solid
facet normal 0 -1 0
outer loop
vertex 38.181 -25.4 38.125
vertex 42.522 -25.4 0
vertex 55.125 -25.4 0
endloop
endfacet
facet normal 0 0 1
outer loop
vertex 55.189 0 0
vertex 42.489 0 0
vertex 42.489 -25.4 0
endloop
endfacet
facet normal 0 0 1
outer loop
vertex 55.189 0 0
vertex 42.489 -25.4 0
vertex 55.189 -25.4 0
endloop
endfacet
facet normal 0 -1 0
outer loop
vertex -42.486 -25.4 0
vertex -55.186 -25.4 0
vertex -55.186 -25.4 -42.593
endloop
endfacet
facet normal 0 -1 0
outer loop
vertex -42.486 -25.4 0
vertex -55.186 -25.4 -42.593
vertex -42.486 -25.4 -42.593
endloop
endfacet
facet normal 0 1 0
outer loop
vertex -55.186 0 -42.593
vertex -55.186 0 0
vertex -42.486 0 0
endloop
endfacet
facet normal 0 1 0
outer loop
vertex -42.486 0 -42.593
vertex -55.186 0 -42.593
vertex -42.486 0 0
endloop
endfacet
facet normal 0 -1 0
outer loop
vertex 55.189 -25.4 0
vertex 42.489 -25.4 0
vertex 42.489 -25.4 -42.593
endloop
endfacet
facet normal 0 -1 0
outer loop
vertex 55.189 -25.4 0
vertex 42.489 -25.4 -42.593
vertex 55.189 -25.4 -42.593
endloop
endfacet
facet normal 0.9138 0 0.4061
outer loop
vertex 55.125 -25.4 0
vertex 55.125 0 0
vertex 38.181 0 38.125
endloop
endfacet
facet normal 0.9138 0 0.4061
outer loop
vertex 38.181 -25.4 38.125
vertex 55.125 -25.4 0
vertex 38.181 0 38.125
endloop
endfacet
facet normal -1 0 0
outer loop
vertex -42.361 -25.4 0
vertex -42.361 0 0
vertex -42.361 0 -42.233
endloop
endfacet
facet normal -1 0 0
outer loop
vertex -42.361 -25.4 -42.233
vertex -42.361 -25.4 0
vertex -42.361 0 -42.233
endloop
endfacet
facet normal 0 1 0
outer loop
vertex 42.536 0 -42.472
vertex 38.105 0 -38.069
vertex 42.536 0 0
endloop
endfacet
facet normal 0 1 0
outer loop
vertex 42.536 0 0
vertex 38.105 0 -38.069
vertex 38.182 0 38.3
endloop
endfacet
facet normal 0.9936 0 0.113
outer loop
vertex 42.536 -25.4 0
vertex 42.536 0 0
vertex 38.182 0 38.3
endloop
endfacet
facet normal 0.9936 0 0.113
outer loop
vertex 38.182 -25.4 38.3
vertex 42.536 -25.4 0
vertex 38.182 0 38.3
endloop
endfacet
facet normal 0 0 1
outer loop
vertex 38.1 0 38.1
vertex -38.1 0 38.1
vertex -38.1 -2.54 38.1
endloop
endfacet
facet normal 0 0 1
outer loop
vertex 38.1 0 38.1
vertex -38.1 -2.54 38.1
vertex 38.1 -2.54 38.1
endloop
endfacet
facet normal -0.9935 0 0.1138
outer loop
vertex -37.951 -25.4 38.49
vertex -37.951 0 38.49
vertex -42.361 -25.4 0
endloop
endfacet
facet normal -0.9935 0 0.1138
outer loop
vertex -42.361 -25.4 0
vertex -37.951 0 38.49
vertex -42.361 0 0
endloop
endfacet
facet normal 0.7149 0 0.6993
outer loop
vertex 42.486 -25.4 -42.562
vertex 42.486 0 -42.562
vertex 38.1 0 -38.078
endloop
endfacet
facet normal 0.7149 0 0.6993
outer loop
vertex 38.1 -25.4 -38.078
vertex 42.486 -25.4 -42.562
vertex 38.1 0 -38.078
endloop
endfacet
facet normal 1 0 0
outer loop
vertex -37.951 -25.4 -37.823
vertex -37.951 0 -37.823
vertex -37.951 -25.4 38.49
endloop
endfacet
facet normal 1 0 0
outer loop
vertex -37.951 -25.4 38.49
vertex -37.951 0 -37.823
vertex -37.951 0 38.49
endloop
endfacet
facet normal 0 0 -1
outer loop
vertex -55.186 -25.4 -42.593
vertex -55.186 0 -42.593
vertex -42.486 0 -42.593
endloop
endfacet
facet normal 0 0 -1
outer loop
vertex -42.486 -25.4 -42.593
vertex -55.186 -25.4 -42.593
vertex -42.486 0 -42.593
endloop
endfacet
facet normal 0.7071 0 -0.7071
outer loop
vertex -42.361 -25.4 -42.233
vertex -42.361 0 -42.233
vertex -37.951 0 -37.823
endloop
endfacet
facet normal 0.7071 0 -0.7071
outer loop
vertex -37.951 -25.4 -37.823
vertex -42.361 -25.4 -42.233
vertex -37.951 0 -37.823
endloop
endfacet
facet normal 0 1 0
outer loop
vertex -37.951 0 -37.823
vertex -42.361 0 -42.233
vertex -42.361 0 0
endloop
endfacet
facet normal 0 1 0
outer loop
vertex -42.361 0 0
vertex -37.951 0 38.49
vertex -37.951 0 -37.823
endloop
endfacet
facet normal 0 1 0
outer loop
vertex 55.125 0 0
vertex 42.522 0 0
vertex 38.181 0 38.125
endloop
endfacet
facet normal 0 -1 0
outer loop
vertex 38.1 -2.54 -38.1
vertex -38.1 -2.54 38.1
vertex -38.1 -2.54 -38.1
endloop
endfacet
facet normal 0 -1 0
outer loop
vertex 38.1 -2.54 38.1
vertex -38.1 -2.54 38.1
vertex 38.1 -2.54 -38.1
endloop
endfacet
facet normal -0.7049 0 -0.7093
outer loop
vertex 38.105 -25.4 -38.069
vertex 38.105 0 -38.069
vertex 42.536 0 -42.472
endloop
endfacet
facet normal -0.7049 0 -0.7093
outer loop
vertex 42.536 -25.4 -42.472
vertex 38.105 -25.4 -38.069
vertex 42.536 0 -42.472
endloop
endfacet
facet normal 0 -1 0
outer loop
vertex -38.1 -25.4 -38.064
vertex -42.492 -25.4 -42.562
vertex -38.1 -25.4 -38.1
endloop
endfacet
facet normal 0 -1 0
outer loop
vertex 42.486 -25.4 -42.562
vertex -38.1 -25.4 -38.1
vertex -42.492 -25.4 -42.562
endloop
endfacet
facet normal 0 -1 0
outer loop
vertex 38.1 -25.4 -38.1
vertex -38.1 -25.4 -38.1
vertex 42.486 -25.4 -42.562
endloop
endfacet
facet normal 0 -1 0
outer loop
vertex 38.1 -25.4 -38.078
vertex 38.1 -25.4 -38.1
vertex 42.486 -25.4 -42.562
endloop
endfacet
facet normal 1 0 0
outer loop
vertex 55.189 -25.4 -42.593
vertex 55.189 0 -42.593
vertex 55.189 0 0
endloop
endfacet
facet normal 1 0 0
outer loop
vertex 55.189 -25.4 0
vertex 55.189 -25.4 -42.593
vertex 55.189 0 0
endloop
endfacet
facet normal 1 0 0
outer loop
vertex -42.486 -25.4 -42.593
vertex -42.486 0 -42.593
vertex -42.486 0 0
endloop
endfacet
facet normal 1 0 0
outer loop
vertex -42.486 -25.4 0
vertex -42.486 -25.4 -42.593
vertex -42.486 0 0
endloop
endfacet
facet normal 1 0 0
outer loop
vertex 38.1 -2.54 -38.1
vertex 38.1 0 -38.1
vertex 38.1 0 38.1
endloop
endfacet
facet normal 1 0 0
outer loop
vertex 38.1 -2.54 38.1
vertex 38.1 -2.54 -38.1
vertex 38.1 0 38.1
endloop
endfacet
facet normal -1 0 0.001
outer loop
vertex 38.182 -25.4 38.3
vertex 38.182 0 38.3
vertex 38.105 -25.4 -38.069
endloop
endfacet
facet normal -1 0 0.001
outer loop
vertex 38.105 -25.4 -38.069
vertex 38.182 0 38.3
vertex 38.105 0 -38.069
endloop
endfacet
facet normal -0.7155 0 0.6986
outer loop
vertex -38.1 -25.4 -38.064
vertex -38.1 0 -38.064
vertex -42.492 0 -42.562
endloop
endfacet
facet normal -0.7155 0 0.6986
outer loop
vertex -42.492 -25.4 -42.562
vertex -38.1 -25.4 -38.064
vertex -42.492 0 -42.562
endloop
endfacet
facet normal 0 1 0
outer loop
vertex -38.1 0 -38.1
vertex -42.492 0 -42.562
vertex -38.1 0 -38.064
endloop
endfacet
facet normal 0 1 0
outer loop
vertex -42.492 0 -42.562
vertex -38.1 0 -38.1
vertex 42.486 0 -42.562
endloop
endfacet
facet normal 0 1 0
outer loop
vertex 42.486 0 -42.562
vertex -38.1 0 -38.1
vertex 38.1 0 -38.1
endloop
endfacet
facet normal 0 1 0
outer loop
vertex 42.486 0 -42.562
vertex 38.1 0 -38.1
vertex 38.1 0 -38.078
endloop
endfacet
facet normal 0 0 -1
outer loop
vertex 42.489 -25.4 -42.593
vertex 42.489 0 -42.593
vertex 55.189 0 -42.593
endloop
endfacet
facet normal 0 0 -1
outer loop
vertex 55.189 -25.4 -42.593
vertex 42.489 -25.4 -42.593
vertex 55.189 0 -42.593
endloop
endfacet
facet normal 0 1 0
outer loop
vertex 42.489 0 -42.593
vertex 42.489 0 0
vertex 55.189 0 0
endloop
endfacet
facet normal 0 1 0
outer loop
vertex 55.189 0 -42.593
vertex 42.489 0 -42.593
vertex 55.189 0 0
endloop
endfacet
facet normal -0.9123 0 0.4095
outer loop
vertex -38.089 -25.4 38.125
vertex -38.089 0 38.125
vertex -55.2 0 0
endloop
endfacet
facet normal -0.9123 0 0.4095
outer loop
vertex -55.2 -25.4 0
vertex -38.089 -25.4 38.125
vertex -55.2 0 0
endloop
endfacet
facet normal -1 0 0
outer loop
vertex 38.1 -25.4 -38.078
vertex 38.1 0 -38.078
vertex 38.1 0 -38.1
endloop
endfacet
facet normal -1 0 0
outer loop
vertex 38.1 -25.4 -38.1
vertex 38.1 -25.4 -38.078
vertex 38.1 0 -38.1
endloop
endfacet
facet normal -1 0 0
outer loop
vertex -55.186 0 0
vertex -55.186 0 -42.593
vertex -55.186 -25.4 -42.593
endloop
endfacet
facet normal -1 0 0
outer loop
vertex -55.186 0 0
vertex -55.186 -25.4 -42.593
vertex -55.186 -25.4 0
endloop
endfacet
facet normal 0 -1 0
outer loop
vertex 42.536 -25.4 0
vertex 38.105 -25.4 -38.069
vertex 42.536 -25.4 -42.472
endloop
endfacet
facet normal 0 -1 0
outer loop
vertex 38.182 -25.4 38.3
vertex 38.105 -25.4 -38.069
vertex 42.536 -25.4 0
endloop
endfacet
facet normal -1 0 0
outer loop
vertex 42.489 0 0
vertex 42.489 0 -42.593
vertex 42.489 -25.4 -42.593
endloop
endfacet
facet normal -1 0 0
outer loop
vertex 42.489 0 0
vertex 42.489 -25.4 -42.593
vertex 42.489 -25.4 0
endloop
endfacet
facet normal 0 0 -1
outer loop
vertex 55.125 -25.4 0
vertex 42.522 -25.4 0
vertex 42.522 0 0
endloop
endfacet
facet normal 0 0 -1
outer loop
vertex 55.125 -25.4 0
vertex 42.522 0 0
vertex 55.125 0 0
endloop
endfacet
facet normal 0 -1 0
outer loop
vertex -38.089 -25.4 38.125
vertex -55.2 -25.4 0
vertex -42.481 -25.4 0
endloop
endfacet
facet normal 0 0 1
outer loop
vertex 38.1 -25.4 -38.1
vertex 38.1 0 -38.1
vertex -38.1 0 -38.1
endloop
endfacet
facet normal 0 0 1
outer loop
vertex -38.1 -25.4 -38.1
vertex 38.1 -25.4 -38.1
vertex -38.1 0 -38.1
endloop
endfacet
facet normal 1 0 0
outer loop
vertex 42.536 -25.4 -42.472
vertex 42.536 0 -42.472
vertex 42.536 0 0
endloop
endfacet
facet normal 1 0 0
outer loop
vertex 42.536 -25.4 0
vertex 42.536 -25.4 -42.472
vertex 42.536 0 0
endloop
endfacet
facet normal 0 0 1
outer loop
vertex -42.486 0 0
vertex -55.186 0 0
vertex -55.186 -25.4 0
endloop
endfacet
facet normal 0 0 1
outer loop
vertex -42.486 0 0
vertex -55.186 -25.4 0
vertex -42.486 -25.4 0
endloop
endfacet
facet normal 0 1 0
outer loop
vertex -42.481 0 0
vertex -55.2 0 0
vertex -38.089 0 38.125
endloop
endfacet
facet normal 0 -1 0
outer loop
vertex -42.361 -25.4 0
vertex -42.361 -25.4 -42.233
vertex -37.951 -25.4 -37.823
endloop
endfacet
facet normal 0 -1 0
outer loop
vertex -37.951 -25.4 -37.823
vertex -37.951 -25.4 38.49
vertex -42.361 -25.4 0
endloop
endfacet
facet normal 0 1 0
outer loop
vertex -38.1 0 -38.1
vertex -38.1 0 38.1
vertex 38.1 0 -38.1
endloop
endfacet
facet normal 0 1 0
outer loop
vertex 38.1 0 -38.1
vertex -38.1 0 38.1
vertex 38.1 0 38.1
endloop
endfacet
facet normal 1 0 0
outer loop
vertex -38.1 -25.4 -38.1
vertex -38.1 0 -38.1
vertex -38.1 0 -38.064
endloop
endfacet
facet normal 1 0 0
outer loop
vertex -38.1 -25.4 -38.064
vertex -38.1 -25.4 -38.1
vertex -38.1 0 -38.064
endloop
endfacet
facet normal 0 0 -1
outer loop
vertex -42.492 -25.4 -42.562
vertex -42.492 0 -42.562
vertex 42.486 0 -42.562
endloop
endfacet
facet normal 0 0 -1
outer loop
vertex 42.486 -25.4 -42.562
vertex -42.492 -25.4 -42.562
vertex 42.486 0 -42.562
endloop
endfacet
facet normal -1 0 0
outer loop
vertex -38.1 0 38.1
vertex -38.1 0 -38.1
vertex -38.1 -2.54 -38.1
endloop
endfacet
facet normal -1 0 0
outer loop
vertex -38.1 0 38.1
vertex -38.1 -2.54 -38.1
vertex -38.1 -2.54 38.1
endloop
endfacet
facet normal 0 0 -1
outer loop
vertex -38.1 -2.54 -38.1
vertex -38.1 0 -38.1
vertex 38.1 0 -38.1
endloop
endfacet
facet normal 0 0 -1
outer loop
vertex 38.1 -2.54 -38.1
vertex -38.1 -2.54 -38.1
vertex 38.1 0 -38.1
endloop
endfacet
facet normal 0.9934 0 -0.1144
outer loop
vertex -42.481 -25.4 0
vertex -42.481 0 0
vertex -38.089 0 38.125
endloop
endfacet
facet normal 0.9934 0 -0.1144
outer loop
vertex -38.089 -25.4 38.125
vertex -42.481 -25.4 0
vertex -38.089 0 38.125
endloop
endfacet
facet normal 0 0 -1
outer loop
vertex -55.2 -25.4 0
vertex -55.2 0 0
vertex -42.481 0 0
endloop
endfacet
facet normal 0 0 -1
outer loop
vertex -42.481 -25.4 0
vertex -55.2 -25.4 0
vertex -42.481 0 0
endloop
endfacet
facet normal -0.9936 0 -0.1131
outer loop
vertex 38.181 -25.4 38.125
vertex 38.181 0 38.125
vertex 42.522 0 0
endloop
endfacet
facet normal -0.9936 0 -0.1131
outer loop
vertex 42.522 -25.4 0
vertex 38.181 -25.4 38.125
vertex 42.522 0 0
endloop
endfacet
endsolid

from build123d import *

# Parameters (mm, degrees)
F6_DEPTH = 25.4
F1_W     = 12.6999916806
F1_H     = 42.59326994
F1_W_2   = 12.7
F0_W     = 76.2
F0_H     = 76.2
F7_DEPTH = 2.54


with BuildPart() as f6:
    # F5 (on Front) → F6 (new body)
    with BuildSketch(Plane.XZ):
        Polygon((-38.0889810622, 38.1251983345), (-55.2002452314, 0), (-42.4809642136, 0), align=None)
    extrude(amount=F6_DEPTH)


with BuildPart() as f6b:
    # F5 (on Front) → F6, piece 2 (new body)
    with BuildSketch(Plane.XZ):
        Polygon((42.5219684839, 0), (55.1252737641, 0), (38.1808280945, 38.1251983345), align=None)
    extrude(amount=F6_DEPTH)


with BuildPart() as f6c:
    # F3 (on Front) → F6, piece 3 (new body)
    with BuildSketch(Plane.XZ):
        Polygon((-37.9513688385, 38.4902358055), (-42.3614494503, 0), (-42.3614494503, -42.2334186733), (-37.9513688385, -37.8233380616), align=None)
    extrude(amount=F6_DEPTH)


with BuildPart() as f6d:
    # F1 (on Front) → F6, piece 4 (new body)
    with BuildSketch(Plane.XZ):
        with Locations((-48.8357709259, -21.29663497)):
            Rectangle(F1_W, F1_H)
    extrude(amount=F6_DEPTH)


with BuildPart() as f6e:
    # F1 (on Front) → F6, piece 5 (new body)
    with BuildSketch(Plane.XZ):
        with Locations((48.8387201501, -21.29663497)):
            Rectangle(F1_W_2, F1_H)
    extrude(amount=F6_DEPTH)


with BuildPart() as f6f:
    # F2 (on face) → F6, piece 6 (new body)
    with BuildSketch(Plane.XZ):
        Polygon((-38.1, -38.0636436107), (-42.4922555685, -42.5622574985), (42.4859188497, -42.5622574985), (38.1004102528, -38.078378886), (38.1, -38.078378801), (38.1, -38.1), (-38.1, -38.1), align=None)
    extrude(amount=F6_DEPTH)


with BuildPart() as f6g:
    # F4 (on Front) → F6, piece 7 (new body)
    with BuildSketch(Plane.XZ):
        Polygon((42.5361469388, 0), (38.1816551089, 38.2997393608), (38.1046272814, -38.0692631006), (42.5361469388, -42.4716100097), align=None)
    extrude(amount=F6_DEPTH)


with BuildPart() as f7:
    # F0 (on Front) → F7 (new body)
    with BuildSketch(Plane.XZ):
        Rectangle(F0_W, F0_H)
    extrude(amount=F7_DEPTH)


solid = Compound([f6.part, f6b.part, f6c.part, f6d.part, f6e.part, f6f.part, f6g.part, f7.part])
